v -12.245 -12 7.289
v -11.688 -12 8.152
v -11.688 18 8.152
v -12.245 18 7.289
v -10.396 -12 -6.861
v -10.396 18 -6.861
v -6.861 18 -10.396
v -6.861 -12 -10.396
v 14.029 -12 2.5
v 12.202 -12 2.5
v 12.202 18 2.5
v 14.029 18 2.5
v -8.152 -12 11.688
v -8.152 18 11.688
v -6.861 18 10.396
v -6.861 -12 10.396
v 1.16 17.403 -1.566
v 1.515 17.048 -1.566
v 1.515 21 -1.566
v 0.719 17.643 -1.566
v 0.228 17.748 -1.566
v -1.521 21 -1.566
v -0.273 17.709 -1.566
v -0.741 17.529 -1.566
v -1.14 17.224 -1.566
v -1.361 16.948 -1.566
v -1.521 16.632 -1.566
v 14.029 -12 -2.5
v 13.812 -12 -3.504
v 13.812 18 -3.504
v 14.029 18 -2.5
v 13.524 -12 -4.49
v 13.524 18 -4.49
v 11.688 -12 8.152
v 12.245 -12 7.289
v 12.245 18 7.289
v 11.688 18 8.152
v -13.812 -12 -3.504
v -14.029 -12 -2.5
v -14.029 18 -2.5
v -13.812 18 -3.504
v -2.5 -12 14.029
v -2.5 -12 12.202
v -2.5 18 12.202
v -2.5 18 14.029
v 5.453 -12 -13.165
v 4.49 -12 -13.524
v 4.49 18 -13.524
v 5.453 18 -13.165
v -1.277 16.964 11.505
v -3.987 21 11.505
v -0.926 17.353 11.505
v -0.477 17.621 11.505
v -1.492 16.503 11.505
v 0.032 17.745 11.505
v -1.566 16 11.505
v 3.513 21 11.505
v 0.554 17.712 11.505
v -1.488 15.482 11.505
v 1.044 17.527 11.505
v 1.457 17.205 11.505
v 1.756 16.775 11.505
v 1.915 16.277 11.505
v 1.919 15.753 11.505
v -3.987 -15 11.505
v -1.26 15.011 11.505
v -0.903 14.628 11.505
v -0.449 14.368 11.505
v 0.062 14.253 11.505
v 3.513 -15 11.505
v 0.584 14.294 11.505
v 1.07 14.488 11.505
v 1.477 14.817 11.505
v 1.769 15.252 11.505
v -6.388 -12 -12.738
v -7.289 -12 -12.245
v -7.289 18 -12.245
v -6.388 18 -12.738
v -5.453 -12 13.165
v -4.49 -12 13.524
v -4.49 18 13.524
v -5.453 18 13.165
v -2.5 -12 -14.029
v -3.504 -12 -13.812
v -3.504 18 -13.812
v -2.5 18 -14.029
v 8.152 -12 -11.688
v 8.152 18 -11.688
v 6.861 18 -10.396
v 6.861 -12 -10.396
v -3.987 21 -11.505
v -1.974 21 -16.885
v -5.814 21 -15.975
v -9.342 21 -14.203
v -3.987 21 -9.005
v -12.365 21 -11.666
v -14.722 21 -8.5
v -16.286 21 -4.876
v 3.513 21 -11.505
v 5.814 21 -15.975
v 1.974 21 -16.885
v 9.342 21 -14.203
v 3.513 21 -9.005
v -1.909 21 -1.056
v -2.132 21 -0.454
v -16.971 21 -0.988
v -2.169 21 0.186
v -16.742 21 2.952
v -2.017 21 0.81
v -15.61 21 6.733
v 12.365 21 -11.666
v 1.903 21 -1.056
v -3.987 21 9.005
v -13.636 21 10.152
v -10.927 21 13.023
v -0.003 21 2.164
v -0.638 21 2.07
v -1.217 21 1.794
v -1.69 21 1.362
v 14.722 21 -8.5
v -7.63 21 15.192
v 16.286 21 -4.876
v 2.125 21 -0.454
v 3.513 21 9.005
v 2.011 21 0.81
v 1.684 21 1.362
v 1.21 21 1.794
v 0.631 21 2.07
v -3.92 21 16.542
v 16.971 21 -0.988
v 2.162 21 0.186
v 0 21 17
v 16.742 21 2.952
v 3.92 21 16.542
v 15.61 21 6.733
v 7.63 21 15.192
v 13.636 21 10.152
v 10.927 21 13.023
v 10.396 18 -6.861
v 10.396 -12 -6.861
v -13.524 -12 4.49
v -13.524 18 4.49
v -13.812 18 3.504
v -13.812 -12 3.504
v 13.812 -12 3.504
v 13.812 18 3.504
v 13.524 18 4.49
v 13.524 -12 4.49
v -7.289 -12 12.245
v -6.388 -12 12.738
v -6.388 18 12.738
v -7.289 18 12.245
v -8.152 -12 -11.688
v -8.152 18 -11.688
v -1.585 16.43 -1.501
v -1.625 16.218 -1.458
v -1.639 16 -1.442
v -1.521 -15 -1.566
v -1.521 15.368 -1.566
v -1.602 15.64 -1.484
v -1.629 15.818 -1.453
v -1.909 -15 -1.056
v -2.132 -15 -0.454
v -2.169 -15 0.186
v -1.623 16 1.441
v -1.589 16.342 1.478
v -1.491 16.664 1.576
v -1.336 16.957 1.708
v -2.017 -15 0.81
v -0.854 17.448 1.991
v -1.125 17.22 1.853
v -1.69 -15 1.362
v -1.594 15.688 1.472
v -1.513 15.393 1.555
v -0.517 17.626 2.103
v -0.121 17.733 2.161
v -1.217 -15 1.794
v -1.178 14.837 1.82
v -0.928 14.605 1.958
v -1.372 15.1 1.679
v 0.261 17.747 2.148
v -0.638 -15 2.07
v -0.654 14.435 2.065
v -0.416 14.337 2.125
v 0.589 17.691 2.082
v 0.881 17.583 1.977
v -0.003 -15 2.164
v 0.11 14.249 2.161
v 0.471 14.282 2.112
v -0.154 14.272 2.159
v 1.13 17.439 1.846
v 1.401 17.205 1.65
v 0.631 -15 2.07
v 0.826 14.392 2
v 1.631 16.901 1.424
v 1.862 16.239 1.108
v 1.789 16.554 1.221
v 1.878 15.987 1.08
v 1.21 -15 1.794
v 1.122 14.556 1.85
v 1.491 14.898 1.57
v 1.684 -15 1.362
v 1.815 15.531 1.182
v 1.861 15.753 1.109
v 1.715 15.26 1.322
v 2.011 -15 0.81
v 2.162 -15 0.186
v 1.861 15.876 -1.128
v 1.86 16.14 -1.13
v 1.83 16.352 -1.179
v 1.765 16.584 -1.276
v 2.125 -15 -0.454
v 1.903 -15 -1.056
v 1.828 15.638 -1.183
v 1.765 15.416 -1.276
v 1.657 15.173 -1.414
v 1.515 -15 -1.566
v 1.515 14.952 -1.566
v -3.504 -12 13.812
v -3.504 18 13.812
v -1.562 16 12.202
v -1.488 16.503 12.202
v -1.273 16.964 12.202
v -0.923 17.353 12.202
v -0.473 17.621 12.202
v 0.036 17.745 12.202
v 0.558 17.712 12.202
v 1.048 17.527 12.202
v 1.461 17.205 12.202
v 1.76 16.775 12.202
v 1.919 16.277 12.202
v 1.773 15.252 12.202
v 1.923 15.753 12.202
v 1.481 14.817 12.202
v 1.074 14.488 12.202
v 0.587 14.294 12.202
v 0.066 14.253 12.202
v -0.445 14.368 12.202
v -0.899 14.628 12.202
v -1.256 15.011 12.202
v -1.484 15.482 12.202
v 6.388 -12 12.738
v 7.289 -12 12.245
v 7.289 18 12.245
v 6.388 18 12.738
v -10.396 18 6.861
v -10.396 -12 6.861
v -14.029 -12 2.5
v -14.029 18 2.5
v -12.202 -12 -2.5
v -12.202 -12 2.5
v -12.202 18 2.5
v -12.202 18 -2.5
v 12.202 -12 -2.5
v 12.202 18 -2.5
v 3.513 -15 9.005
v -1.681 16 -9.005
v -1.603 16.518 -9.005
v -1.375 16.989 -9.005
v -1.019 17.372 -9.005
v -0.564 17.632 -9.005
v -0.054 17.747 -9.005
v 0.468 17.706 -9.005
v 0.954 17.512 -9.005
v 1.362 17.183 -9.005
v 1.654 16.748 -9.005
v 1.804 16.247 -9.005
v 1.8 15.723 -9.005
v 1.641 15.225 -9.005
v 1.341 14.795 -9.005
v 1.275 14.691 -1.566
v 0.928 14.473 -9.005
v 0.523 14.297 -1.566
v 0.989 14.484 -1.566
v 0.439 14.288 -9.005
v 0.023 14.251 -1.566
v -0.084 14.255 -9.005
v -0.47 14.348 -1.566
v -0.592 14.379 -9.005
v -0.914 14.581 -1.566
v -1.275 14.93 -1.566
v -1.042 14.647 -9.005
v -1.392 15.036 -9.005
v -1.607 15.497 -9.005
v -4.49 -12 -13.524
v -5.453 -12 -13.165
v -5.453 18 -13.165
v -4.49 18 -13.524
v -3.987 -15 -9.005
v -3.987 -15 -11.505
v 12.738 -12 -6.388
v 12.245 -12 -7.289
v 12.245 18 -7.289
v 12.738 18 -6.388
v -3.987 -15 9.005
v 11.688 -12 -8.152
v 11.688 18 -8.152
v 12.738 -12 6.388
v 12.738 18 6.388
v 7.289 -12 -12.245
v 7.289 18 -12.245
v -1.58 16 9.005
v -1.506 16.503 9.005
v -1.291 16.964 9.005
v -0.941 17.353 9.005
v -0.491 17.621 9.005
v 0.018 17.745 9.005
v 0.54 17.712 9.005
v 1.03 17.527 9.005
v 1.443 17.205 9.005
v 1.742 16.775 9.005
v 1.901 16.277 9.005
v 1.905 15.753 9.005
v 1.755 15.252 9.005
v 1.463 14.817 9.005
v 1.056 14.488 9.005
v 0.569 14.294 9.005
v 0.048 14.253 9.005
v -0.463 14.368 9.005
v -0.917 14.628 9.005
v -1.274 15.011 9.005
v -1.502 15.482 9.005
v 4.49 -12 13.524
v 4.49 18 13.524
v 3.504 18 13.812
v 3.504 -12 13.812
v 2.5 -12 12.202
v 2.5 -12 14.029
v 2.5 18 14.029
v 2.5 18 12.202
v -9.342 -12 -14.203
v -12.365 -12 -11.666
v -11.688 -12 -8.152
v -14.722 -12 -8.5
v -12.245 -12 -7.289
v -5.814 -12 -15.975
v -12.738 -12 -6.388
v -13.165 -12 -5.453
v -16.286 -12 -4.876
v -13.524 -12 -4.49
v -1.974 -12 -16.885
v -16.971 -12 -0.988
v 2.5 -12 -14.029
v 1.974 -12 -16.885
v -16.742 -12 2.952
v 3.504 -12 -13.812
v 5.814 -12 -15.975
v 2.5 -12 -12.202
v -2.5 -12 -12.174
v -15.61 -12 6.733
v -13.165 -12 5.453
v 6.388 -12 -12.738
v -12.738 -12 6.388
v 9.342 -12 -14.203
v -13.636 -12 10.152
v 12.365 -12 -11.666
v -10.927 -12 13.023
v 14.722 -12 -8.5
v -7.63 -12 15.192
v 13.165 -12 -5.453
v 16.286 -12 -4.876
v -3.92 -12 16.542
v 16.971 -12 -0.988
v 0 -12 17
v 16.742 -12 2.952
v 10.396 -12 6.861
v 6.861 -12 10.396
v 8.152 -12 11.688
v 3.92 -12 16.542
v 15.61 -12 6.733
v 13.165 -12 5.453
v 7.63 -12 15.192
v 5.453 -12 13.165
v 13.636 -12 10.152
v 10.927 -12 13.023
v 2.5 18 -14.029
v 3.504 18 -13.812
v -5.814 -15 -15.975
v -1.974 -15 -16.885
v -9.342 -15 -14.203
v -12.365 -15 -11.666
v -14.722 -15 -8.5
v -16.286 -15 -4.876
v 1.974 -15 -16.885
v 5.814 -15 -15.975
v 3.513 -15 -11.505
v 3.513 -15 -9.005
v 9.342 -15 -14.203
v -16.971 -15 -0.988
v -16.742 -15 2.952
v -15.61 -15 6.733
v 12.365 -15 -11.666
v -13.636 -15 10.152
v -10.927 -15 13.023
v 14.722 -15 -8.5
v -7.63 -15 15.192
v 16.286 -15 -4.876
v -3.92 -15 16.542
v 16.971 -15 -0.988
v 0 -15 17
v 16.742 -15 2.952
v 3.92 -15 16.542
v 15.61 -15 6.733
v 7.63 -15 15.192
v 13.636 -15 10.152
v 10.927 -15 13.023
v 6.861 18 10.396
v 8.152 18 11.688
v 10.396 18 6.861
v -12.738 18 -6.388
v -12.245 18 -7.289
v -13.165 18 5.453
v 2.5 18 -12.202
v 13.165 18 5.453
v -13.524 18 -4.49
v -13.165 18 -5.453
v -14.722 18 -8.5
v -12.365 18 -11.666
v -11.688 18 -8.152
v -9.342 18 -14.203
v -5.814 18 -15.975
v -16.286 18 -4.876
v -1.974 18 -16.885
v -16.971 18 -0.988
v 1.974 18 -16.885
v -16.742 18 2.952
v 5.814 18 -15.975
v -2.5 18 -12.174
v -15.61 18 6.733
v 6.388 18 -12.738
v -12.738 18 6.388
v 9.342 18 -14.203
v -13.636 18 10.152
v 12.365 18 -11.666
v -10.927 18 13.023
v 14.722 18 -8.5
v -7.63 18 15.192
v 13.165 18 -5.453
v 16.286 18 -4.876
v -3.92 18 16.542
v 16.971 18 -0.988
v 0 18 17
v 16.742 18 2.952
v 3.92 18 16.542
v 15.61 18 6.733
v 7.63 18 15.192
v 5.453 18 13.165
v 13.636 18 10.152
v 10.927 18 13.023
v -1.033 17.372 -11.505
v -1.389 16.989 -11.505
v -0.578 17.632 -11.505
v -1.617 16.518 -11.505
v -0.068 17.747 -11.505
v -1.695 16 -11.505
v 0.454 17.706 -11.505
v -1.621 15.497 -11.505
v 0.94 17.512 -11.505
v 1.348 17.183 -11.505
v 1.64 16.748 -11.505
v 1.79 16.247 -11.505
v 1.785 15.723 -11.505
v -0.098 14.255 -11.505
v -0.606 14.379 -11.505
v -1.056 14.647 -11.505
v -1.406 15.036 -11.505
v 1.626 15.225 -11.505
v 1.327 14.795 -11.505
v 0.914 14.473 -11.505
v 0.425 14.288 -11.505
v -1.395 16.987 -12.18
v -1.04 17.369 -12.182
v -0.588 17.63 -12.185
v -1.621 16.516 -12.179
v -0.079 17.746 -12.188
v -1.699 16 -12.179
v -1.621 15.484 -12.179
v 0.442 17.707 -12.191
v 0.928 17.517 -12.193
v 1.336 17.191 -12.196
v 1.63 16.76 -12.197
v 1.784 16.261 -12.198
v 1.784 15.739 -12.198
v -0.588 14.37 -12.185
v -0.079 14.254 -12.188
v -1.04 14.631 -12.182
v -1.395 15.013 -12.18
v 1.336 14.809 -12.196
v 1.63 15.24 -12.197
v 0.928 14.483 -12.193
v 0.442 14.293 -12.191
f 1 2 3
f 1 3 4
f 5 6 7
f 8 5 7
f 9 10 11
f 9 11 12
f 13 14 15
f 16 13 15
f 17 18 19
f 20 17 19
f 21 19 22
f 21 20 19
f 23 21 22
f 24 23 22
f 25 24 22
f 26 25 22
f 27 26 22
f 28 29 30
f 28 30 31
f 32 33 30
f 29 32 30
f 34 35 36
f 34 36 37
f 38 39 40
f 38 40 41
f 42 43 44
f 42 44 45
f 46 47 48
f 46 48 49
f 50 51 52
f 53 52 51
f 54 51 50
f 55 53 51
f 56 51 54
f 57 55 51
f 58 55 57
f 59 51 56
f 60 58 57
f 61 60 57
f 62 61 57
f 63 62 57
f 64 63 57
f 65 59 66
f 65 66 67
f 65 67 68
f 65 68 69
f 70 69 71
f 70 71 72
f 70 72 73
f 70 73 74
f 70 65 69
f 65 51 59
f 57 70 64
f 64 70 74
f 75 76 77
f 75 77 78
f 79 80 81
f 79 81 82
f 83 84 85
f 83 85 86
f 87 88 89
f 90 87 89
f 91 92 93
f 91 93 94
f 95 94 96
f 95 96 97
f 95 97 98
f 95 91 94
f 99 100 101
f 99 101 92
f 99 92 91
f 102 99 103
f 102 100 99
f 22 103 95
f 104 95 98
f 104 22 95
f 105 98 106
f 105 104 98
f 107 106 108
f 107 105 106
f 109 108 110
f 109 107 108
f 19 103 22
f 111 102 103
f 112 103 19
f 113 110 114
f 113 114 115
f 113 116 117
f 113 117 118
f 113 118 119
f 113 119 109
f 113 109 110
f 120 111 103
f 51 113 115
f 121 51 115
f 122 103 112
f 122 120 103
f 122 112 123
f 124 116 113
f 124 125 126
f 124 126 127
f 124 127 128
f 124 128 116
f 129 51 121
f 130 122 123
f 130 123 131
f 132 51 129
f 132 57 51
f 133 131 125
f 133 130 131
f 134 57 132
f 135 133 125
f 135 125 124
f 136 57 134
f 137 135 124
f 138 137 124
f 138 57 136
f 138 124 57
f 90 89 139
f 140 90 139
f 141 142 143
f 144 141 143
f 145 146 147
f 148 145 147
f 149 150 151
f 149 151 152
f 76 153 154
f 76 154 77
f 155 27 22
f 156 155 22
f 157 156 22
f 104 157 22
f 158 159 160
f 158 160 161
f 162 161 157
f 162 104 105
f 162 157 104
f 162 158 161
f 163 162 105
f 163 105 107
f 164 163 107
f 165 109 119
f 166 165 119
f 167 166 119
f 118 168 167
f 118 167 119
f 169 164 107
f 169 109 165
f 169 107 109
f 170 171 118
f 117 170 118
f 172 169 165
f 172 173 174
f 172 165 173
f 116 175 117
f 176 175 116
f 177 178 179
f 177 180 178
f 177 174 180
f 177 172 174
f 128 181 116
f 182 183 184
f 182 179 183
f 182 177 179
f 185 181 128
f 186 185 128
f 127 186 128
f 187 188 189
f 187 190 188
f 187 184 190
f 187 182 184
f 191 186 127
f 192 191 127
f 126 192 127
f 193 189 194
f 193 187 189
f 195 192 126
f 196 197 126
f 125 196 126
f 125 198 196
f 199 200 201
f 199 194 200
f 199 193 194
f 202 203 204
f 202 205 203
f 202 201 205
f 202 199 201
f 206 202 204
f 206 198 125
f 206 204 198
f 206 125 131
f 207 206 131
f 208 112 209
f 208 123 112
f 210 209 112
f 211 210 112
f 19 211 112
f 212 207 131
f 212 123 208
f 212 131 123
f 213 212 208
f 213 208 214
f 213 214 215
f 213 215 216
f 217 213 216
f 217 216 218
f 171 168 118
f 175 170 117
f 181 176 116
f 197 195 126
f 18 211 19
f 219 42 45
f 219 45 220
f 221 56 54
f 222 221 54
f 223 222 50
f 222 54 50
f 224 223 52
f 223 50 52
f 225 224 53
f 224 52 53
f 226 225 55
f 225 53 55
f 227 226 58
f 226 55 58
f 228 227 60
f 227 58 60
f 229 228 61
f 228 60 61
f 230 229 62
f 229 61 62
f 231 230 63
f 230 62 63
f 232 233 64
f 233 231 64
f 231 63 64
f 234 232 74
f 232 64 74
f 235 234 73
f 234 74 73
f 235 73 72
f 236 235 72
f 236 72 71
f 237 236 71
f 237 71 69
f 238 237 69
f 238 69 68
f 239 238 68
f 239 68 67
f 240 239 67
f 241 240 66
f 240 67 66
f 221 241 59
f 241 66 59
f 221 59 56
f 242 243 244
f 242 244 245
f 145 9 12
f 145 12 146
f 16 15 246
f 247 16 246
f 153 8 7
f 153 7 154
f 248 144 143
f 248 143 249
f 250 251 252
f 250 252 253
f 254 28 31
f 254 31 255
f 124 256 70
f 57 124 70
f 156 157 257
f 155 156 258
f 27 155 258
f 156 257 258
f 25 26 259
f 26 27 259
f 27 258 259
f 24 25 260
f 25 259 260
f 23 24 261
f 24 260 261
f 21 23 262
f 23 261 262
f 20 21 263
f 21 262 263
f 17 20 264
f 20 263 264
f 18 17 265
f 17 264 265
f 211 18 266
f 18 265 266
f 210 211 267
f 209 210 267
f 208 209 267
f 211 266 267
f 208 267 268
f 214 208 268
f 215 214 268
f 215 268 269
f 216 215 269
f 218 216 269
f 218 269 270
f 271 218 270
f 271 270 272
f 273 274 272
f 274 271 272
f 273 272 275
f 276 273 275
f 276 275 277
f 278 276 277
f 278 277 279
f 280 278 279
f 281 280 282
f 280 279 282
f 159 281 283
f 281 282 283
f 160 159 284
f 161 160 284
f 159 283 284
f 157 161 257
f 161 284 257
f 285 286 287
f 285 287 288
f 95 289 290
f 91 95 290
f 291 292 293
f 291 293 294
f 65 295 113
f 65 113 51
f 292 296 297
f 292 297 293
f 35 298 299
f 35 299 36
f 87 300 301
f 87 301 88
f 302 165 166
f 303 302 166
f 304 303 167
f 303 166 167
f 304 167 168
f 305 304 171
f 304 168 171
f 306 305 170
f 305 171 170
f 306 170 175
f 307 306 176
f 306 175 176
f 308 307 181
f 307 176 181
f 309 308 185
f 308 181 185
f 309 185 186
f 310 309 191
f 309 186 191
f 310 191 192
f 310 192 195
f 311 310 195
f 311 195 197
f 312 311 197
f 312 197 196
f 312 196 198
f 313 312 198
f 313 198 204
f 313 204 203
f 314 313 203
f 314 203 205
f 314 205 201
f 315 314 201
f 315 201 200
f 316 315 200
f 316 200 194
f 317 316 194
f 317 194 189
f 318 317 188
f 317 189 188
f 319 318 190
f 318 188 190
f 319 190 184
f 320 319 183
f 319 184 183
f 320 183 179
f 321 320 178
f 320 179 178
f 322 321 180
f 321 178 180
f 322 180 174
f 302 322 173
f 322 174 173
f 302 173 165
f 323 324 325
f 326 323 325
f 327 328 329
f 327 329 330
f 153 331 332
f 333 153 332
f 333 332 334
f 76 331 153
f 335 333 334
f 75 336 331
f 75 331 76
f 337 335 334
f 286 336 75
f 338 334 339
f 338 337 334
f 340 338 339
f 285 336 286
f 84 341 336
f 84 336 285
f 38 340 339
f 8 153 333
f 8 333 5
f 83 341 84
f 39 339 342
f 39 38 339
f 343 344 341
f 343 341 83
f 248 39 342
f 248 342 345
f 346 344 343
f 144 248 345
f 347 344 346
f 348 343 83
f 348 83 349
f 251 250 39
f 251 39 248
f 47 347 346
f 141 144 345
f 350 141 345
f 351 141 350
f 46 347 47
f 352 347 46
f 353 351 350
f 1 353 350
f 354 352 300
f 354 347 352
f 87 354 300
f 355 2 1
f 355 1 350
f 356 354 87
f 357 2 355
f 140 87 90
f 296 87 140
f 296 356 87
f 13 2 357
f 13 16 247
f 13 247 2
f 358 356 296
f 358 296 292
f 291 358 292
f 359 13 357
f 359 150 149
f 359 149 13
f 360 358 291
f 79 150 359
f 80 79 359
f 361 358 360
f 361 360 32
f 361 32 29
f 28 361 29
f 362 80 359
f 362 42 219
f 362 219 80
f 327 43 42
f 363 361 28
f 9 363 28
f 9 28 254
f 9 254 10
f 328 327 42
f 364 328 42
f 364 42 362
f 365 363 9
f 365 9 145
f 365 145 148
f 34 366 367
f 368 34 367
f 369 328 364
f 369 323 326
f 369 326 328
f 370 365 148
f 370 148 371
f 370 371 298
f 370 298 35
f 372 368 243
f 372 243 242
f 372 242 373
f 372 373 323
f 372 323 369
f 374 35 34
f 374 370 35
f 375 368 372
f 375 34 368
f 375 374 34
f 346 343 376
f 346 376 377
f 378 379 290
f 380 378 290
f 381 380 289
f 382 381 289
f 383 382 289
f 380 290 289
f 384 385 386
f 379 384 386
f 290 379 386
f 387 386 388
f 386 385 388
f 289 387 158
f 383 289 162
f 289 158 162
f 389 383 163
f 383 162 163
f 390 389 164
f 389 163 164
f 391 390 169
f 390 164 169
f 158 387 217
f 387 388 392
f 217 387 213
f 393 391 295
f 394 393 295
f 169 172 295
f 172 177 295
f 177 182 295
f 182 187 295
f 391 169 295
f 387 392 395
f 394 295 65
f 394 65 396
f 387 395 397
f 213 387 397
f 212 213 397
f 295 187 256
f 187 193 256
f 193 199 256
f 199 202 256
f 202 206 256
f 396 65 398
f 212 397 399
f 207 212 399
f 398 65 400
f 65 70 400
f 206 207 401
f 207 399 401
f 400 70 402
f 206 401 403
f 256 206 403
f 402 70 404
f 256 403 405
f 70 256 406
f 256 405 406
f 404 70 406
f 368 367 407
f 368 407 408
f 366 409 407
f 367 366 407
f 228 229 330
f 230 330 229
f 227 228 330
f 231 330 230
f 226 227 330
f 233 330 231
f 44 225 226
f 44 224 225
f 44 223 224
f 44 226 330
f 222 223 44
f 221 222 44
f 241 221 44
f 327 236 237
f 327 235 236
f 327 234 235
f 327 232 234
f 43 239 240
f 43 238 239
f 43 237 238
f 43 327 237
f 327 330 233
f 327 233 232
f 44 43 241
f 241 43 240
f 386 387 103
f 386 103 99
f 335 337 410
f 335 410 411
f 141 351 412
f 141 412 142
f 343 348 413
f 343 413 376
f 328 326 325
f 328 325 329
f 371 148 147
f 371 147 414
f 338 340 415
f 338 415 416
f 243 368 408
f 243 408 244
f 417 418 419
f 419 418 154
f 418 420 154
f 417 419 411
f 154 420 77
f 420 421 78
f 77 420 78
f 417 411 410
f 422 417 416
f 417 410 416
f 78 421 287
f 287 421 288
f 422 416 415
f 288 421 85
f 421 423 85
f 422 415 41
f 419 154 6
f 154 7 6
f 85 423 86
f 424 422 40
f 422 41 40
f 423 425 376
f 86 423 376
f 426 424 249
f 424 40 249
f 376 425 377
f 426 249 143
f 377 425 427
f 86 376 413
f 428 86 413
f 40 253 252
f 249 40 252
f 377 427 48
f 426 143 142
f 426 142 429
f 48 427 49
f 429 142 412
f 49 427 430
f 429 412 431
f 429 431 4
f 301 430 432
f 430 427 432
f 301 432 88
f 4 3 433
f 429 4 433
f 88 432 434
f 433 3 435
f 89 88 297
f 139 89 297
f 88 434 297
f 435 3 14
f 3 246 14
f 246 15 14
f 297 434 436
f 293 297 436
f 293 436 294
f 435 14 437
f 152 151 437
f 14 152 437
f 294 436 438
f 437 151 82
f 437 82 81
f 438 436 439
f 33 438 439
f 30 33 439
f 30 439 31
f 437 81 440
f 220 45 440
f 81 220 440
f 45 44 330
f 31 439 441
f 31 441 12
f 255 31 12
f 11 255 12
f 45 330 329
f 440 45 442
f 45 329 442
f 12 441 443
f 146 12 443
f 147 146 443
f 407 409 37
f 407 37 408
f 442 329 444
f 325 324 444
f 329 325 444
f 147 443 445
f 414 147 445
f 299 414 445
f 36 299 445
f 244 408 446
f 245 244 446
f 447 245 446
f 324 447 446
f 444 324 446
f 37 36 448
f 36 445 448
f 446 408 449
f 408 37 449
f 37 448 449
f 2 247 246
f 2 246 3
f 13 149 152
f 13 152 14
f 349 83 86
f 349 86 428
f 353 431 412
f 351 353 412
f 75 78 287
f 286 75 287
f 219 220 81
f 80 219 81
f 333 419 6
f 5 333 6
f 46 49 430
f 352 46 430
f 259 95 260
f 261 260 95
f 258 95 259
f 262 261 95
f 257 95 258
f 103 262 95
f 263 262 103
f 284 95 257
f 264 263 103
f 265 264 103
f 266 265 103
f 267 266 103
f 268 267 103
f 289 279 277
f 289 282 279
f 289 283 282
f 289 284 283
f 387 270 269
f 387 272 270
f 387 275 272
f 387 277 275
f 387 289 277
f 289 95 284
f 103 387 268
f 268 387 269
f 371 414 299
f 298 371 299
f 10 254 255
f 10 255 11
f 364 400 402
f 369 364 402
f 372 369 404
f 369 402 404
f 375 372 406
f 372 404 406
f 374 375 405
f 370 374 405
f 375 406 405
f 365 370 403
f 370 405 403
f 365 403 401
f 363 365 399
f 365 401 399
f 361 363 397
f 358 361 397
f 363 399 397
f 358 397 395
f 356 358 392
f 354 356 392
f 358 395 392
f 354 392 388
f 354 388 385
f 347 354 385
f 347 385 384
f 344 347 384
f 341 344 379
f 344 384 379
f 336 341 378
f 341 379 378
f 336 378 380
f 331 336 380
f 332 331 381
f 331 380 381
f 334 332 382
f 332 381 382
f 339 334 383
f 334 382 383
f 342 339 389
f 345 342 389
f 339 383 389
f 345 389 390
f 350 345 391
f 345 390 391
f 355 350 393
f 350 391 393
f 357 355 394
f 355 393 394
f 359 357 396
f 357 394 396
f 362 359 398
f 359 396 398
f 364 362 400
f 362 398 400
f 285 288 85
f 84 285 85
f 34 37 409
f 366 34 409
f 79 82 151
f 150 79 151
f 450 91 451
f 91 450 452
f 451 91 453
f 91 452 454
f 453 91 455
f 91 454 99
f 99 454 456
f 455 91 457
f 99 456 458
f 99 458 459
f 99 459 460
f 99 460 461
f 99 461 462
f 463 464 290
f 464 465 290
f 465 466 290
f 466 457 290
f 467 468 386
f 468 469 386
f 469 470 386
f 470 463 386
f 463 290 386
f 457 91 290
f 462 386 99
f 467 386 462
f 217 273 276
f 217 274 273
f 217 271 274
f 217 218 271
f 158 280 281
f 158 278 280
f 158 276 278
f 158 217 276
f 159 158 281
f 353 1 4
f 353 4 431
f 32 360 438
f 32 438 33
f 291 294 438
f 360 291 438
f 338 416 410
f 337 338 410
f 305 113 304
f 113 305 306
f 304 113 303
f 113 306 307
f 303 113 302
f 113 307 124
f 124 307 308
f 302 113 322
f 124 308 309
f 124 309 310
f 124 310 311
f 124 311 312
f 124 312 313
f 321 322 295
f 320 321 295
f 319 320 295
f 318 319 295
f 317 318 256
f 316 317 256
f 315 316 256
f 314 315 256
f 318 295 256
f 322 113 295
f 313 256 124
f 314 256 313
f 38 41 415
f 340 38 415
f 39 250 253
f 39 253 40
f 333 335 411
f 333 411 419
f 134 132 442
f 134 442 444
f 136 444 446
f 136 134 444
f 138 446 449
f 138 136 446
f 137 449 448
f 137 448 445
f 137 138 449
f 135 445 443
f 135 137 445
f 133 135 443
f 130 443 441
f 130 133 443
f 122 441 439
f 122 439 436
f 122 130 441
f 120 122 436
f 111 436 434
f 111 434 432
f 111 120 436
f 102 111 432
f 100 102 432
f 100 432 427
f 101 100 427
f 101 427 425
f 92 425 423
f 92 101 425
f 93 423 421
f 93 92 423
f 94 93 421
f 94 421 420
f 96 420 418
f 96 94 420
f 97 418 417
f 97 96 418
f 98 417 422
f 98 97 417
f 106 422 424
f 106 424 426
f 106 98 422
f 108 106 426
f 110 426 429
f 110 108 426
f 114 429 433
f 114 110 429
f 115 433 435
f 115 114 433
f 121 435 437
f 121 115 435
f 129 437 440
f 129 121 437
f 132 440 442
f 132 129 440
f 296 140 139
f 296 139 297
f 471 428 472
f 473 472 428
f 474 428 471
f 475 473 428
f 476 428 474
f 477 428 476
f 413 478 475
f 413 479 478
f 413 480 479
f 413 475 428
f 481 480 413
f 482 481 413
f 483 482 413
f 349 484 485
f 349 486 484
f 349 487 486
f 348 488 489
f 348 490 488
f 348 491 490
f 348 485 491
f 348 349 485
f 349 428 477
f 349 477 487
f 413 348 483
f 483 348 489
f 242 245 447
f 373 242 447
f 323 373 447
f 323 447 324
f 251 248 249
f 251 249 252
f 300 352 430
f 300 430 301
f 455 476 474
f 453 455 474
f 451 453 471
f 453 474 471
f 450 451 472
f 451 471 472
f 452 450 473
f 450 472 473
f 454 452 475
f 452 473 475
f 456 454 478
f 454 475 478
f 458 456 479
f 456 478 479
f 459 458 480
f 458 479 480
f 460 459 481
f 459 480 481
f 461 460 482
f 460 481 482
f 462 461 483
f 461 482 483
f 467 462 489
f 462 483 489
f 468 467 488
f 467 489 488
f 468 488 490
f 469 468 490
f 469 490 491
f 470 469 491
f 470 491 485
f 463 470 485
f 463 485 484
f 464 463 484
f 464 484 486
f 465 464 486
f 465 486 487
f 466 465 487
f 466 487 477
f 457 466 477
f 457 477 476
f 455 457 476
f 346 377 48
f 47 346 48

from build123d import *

# Parameters (mm, degrees)
SKETCH1_R           = 17
BOSS_EXTRUDE1_DEPTH = 3
SKETCH3_R           = 17
BOSS_EXTRUDE2_DEPTH = 3
BOSS_EXTRUDE3_DEPTH = 31
SKETCH7_R           = 1.751351815
CUT_EXTRUDE11_DEPTH = 50
CUT_EXTRUDE1_DEPTH  = 50
SKETCH8_W           = 7.5
SKETCH8_H           = 2.5
CUT_EXTRUDE12_DEPTH = 40


with BuildPart() as part:
    # Sketch1 → Boss-Extrude1 (new body)
    with BuildSketch(Plane(origin=(0, -15, 0), x_dir=(1, 0, 0), z_dir=(0, 1, 0))):
        with Locations(Location((0, 0, 0), (0, 0, 270))):
            Circle(SKETCH1_R)
    extrude(amount=BOSS_EXTRUDE1_DEPTH)



with BuildPart() as body_2:
    # Sketch3 → Boss-Extrude2 (new body)
    with BuildSketch(Plane(origin=(0, 21, 0), x_dir=(1, 0, 0), z_dir=(0, 1, 0))):
        with Locations(Location((0, 0, 0), (0, 0, 270))):
            Circle(SKETCH3_R)
    extrude(amount=-BOSS_EXTRUDE2_DEPTH)


with BuildPart() as part_1:
    add(part.part)

    add(body_2.part)  # Boss-Extrude3 merges body 2
    # Sketch6 → Boss-Extrude3 (add)
    with BuildSketch(Plane(origin=(0, -12, 0), x_dir=(1, 0, 0), z_dir=(0, 1, 0))):
        Polygon((-10.39609313, -6.860559341), (-11.68775931, -8.152225055), (-12.244775891, -7.288892753), (-12.738139369, -6.387668662), (-13.165283017, -5.453239195), (-13.523988426, -4.490460269), (-13.812389225, -3.504338907), (-14.028987847, -2.499999944), (-12.202296406, -2.499999944), (-12.202296406, 2.499999944), (-14.028987847, 2.499999944), (-13.812389225, 3.504338907), (-13.523988426, 4.490460269), (-13.165283017, 5.453239195), (-12.738139369, 6.387668662), (-12.244775891, 7.288892753), (-11.68775931, 8.152225055), (-10.39609313, 6.860559341), (-6.860559341, 10.39609313), (-8.152225055, 11.68775931), (-7.288892753, 12.244775891), (-6.387668662, 12.738139369), (-5.453239195, 13.165283017), (-4.490460269, 13.523988426), (-3.504338907, 13.812389225), (-2.499999944, 14.028987847), (-2.499999944, 12.174172863), (2.499999944, 12.202296406), (2.499999944, 14.028987847), (3.504338907, 13.812389225), (4.490460269, 13.523988426), (5.453239195, 13.165283017), (6.387668662, 12.738139369), (7.288892753, 12.244775891), (8.152225055, 11.68775931), (6.860559341, 10.39609313), (10.39609313, 6.860559341), (11.68775931, 8.152225055), (12.244775891, 7.288892753), (12.738139369, 6.387668662), (13.165283017, 5.453239195), (13.523988426, 4.490460269), (13.812389225, 3.504338907), (14.028987847, 2.499999944), (12.202296406, 2.499999944), (12.202296406, -2.499999944), (14.028987847, -2.499999944), (13.812389225, -3.504338907), (13.523988426, -4.490460269), (13.165283017, -5.453239195), (12.738139369, -6.387668662), (12.244775891, -7.288892753), (11.68775931, -8.152225055), (10.39609313, -6.860559341), (6.860559341, -10.39609313), (8.152225055, -11.68775931), (7.288892753, -12.244775891), (6.387668662, -12.738139369), (5.453239195, -13.165283017), (4.490460269, -13.523988426), (3.504338907, -13.812389225), (2.499999944, -14.028987847), (2.499999944, -12.202296406), (-2.499999944, -12.202296406), (-2.499999944, -14.028987847), (-3.504338907, -13.812389225), (-4.490460269, -13.523988426), (-5.453239195, -13.165283017), (-6.387668662, -12.738139369), (-7.288892753, -12.244775891), (-8.152225055, -11.68775931), (-6.860559341, -10.39609313), align=None)
    extrude(amount=BOSS_EXTRUDE3_DEPTH)

    # Sketch7 → Cut-Extrude11 (cut)
    with BuildSketch(Plane(origin=(-0.068553102, 0, -12.187849043), x_dir=(-0.9999841817006155, 0, 0.005624619858302935), z_dir=(-0.005624619858302935, 0, -0.9999841817006155))):
        with Locations((-0.120761258, 16)):
            Circle(SKETCH7_R)
    extrude(amount=-CUT_EXTRUDE11_DEPTH, mode=Mode.SUBTRACT)

    # Sketch2 → Cut-Extrude1 (cut)
    with BuildSketch(Plane(origin=(0, -15, 0), x_dir=(1, 0, 0), z_dir=(0, 1, 0))):
        with BuildLine():
            Line((1.514793699, 1.566442938), (-1.521232282, 1.566442938))
            ThreePointArc((-1.521232282, 1.566442938), (-0.003219291, -2.164389177), (1.514793699, 1.566442938))
        make_face()
    extrude(amount=CUT_EXTRUDE1_DEPTH, mode=Mode.SUBTRACT)

    # Sketch8 → Cut-Extrude12 (cut)
    with BuildSketch(Plane(origin=(0, -15, 0), x_dir=(1, 0, 0), z_dir=(0, 1, 0))):
        with Locations((-0.237061367, 10.255385433)):
            Rectangle(SKETCH8_W, SKETCH8_H)
    cut_extrude12 = extrude(amount=CUT_EXTRUDE12_DEPTH, mode=Mode.SUBTRACT)

    # Mirror1: Cut-Extrude12 across plane
    add(cut_extrude12.mirror(Plane.XY), mode=Mode.SUBTRACT)


solid = part_1.part
